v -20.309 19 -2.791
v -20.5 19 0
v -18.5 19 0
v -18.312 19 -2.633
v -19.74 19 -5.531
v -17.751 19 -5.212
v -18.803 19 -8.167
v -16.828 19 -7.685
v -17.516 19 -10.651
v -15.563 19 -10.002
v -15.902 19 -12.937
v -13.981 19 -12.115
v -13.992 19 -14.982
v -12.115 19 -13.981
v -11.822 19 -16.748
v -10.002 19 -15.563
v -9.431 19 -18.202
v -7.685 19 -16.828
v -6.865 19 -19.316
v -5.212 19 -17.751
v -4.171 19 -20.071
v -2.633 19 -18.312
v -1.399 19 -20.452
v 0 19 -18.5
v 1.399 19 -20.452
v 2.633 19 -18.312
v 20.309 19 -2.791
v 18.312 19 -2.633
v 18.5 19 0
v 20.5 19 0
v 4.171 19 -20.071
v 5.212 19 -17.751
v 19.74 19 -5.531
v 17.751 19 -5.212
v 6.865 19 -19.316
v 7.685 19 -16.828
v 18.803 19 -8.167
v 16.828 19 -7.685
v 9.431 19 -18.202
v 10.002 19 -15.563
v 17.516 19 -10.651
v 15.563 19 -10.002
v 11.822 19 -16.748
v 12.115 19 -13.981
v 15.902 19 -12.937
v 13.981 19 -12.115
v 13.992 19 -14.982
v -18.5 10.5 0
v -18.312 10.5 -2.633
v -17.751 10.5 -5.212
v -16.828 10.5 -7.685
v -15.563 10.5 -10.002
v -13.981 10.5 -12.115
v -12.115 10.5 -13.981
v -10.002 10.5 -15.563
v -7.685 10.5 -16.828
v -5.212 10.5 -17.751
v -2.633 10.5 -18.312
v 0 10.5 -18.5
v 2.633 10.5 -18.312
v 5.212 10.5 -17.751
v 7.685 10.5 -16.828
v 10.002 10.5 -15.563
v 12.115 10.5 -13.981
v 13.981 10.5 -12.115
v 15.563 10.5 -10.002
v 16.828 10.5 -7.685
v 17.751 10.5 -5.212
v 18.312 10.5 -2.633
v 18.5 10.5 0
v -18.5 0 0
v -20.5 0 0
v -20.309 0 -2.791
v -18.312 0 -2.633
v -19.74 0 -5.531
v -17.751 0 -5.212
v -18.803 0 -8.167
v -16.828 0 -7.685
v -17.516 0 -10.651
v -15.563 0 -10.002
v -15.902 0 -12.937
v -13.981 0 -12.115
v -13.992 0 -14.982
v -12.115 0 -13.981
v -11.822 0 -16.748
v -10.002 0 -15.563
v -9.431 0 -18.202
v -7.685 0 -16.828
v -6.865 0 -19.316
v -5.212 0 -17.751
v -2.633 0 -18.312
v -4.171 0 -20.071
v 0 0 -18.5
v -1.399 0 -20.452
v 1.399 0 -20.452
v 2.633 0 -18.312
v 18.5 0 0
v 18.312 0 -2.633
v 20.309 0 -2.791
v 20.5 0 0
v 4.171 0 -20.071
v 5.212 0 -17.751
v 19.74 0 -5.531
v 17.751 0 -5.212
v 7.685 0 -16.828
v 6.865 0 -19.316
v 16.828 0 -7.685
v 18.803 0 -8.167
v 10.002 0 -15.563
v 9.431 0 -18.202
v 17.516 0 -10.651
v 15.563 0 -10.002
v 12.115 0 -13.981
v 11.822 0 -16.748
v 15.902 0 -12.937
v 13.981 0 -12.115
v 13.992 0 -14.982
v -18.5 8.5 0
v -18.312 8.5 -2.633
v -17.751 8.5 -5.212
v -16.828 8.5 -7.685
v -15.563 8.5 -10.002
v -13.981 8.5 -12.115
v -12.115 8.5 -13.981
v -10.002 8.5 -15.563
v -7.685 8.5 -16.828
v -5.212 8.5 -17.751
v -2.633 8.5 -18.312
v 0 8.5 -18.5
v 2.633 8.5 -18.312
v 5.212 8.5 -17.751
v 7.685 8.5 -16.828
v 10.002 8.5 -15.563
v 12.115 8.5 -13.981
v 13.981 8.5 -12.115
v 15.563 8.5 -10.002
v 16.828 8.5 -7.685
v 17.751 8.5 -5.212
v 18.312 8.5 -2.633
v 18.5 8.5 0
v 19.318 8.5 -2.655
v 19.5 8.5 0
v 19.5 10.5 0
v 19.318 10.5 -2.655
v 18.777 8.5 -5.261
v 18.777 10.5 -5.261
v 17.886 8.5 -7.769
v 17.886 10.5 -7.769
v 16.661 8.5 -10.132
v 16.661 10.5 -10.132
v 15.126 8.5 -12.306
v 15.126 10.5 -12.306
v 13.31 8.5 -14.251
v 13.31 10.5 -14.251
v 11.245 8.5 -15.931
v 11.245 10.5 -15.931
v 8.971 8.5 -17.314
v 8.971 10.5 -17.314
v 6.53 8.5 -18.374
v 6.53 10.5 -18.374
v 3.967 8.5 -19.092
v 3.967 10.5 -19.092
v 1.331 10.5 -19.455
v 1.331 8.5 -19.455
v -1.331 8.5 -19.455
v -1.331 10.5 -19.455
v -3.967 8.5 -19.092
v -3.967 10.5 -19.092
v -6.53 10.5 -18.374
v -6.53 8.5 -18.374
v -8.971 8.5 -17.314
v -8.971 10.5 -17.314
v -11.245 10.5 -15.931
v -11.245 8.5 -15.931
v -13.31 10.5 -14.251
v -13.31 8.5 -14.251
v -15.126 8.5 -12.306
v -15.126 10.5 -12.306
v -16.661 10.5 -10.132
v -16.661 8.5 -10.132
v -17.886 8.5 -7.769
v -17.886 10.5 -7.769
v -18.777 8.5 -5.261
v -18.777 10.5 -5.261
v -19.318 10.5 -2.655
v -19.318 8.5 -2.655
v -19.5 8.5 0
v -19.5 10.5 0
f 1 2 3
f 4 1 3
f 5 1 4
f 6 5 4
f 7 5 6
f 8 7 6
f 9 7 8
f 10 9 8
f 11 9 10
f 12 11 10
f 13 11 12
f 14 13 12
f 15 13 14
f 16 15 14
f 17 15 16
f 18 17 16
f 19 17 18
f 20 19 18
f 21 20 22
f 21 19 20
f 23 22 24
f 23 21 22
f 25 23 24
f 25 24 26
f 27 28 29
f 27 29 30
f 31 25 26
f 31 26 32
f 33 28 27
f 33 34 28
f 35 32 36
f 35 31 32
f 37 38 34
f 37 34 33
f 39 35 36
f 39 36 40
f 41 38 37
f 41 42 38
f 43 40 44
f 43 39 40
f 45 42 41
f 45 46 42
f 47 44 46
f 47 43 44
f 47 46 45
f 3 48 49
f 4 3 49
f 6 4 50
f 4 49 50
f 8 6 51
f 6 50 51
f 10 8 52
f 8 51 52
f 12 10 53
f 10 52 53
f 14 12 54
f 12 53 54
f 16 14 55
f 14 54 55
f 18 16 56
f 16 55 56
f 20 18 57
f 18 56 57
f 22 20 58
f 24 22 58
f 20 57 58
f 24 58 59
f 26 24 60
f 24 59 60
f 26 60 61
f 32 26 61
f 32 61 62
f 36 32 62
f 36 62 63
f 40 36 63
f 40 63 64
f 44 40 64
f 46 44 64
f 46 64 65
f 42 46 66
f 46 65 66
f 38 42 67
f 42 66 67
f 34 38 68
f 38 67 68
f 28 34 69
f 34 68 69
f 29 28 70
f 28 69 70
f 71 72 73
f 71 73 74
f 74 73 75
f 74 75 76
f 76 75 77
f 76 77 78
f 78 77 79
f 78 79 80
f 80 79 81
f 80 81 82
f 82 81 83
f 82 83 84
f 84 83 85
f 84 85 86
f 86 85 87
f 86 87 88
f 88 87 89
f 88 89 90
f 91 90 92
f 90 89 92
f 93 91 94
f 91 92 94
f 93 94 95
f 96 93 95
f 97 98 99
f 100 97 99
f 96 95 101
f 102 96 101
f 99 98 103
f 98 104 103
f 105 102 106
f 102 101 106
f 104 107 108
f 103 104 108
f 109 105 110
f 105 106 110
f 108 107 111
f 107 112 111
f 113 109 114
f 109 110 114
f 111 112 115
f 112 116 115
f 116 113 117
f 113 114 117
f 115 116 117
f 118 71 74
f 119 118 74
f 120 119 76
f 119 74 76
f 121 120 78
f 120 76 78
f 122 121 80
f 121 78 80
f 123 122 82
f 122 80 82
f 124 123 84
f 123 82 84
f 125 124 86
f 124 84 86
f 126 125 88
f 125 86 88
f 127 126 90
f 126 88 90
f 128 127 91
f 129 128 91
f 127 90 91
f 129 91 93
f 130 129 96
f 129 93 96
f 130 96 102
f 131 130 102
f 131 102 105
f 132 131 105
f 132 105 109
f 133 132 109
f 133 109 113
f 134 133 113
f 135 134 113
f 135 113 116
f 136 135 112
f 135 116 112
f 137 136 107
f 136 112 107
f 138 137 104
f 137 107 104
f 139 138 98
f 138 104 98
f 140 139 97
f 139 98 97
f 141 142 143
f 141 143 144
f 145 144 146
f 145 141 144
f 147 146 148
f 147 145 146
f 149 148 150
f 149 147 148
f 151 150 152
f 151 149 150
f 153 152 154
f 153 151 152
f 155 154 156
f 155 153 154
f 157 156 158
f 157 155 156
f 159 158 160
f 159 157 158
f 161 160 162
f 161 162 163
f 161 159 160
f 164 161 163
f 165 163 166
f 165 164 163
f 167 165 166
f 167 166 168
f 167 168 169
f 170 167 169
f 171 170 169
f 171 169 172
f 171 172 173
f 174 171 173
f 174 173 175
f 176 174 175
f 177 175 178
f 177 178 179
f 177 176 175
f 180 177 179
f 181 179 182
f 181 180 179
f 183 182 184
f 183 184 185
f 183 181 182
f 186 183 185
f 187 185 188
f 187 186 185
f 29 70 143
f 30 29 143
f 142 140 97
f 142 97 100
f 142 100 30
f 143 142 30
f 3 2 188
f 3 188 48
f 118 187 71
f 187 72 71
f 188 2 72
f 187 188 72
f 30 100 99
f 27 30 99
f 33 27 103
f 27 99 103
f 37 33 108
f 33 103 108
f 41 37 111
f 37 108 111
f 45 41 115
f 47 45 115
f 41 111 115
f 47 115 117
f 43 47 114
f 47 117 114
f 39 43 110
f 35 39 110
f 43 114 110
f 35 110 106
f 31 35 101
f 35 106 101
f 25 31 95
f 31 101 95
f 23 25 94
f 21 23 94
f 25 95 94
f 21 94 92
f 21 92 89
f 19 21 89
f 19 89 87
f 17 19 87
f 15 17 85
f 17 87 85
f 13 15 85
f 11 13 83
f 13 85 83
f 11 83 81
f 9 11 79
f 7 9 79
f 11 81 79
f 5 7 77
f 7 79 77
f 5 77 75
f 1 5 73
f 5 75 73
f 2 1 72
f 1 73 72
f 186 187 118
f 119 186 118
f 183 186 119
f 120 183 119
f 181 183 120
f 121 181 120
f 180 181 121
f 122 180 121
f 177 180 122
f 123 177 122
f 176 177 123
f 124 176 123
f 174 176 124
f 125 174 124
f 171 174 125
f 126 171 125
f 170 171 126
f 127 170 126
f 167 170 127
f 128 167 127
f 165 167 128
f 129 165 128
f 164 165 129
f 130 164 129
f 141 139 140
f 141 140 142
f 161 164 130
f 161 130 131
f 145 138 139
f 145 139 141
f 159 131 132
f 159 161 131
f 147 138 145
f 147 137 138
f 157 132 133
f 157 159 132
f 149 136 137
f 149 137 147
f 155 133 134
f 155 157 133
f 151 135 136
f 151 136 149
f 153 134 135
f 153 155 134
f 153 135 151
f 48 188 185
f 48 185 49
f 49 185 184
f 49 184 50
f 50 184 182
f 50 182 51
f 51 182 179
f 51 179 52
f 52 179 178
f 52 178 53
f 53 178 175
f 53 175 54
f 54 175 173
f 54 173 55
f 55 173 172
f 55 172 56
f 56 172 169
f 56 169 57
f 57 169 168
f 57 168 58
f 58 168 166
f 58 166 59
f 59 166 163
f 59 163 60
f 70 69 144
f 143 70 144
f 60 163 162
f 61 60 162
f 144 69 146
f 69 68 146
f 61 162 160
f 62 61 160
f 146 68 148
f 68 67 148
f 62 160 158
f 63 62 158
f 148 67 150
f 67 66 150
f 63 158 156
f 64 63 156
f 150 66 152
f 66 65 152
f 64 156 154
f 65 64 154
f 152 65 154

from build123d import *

# Parameters (mm, degrees)
BOSS_EXTRUDE1_DEPTH = 8.5
BOSS_EXTRUDE2_DEPTH = 2
BOSS_EXTRUDE3_DEPTH = 8.5


with BuildPart() as part:
    # Sketch1 → Boss-Extrude1 (new body)
    with BuildSketch(Plane(origin=(0, 0, 0), x_dir=(1, 0, 0), z_dir=(0, 1, 0))):
        with BuildLine():
            ThreePointArc((-18.5, 0), (0, 18.5), (18.5, 0))
            Line((18.5, 0), (20.5, 0))
            ThreePointArc((20.5, 0), (0, 20.5), (-20.5, 0))
            Line((-20.5, 0), (-18.5, 0))
        make_face()
    extrude(amount=BOSS_EXTRUDE1_DEPTH)

    # Sketch2 → Boss-Extrude2 (add)
    with BuildSketch(Plane(origin=(0, 8.5, 0), x_dir=(1, 0, 0), z_dir=(0, 1, 0))):
        with BuildLine():
            Line((-19.5, 0), (-20.5, 0))
            ThreePointArc((-20.5, 0), (0, 20.5), (20.5, 0))
            Line((20.5, 0), (19.5, 0))
            ThreePointArc((19.5, 0), (0, 19.5), (-19.5, 0))
        make_face()
    extrude(amount=BOSS_EXTRUDE2_DEPTH)

    # Sketch3 → Boss-Extrude3 (add)
    with BuildSketch(Plane(origin=(0, 10.5, 0), x_dir=(1, 0, 0), z_dir=(0, 1, 0))):
        with BuildLine():
            Line((-20.5, 0), (-18.5, 0))
            ThreePointArc((-18.5, 0), (0, 18.5), (18.5, 0))
            Line((18.5, 0), (20.5, 0))
            ThreePointArc((20.5, 0), (0, 20.5), (-20.5, 0))
        make_face()
    extrude(amount=BOSS_EXTRUDE3_DEPTH)


solid = part.part
